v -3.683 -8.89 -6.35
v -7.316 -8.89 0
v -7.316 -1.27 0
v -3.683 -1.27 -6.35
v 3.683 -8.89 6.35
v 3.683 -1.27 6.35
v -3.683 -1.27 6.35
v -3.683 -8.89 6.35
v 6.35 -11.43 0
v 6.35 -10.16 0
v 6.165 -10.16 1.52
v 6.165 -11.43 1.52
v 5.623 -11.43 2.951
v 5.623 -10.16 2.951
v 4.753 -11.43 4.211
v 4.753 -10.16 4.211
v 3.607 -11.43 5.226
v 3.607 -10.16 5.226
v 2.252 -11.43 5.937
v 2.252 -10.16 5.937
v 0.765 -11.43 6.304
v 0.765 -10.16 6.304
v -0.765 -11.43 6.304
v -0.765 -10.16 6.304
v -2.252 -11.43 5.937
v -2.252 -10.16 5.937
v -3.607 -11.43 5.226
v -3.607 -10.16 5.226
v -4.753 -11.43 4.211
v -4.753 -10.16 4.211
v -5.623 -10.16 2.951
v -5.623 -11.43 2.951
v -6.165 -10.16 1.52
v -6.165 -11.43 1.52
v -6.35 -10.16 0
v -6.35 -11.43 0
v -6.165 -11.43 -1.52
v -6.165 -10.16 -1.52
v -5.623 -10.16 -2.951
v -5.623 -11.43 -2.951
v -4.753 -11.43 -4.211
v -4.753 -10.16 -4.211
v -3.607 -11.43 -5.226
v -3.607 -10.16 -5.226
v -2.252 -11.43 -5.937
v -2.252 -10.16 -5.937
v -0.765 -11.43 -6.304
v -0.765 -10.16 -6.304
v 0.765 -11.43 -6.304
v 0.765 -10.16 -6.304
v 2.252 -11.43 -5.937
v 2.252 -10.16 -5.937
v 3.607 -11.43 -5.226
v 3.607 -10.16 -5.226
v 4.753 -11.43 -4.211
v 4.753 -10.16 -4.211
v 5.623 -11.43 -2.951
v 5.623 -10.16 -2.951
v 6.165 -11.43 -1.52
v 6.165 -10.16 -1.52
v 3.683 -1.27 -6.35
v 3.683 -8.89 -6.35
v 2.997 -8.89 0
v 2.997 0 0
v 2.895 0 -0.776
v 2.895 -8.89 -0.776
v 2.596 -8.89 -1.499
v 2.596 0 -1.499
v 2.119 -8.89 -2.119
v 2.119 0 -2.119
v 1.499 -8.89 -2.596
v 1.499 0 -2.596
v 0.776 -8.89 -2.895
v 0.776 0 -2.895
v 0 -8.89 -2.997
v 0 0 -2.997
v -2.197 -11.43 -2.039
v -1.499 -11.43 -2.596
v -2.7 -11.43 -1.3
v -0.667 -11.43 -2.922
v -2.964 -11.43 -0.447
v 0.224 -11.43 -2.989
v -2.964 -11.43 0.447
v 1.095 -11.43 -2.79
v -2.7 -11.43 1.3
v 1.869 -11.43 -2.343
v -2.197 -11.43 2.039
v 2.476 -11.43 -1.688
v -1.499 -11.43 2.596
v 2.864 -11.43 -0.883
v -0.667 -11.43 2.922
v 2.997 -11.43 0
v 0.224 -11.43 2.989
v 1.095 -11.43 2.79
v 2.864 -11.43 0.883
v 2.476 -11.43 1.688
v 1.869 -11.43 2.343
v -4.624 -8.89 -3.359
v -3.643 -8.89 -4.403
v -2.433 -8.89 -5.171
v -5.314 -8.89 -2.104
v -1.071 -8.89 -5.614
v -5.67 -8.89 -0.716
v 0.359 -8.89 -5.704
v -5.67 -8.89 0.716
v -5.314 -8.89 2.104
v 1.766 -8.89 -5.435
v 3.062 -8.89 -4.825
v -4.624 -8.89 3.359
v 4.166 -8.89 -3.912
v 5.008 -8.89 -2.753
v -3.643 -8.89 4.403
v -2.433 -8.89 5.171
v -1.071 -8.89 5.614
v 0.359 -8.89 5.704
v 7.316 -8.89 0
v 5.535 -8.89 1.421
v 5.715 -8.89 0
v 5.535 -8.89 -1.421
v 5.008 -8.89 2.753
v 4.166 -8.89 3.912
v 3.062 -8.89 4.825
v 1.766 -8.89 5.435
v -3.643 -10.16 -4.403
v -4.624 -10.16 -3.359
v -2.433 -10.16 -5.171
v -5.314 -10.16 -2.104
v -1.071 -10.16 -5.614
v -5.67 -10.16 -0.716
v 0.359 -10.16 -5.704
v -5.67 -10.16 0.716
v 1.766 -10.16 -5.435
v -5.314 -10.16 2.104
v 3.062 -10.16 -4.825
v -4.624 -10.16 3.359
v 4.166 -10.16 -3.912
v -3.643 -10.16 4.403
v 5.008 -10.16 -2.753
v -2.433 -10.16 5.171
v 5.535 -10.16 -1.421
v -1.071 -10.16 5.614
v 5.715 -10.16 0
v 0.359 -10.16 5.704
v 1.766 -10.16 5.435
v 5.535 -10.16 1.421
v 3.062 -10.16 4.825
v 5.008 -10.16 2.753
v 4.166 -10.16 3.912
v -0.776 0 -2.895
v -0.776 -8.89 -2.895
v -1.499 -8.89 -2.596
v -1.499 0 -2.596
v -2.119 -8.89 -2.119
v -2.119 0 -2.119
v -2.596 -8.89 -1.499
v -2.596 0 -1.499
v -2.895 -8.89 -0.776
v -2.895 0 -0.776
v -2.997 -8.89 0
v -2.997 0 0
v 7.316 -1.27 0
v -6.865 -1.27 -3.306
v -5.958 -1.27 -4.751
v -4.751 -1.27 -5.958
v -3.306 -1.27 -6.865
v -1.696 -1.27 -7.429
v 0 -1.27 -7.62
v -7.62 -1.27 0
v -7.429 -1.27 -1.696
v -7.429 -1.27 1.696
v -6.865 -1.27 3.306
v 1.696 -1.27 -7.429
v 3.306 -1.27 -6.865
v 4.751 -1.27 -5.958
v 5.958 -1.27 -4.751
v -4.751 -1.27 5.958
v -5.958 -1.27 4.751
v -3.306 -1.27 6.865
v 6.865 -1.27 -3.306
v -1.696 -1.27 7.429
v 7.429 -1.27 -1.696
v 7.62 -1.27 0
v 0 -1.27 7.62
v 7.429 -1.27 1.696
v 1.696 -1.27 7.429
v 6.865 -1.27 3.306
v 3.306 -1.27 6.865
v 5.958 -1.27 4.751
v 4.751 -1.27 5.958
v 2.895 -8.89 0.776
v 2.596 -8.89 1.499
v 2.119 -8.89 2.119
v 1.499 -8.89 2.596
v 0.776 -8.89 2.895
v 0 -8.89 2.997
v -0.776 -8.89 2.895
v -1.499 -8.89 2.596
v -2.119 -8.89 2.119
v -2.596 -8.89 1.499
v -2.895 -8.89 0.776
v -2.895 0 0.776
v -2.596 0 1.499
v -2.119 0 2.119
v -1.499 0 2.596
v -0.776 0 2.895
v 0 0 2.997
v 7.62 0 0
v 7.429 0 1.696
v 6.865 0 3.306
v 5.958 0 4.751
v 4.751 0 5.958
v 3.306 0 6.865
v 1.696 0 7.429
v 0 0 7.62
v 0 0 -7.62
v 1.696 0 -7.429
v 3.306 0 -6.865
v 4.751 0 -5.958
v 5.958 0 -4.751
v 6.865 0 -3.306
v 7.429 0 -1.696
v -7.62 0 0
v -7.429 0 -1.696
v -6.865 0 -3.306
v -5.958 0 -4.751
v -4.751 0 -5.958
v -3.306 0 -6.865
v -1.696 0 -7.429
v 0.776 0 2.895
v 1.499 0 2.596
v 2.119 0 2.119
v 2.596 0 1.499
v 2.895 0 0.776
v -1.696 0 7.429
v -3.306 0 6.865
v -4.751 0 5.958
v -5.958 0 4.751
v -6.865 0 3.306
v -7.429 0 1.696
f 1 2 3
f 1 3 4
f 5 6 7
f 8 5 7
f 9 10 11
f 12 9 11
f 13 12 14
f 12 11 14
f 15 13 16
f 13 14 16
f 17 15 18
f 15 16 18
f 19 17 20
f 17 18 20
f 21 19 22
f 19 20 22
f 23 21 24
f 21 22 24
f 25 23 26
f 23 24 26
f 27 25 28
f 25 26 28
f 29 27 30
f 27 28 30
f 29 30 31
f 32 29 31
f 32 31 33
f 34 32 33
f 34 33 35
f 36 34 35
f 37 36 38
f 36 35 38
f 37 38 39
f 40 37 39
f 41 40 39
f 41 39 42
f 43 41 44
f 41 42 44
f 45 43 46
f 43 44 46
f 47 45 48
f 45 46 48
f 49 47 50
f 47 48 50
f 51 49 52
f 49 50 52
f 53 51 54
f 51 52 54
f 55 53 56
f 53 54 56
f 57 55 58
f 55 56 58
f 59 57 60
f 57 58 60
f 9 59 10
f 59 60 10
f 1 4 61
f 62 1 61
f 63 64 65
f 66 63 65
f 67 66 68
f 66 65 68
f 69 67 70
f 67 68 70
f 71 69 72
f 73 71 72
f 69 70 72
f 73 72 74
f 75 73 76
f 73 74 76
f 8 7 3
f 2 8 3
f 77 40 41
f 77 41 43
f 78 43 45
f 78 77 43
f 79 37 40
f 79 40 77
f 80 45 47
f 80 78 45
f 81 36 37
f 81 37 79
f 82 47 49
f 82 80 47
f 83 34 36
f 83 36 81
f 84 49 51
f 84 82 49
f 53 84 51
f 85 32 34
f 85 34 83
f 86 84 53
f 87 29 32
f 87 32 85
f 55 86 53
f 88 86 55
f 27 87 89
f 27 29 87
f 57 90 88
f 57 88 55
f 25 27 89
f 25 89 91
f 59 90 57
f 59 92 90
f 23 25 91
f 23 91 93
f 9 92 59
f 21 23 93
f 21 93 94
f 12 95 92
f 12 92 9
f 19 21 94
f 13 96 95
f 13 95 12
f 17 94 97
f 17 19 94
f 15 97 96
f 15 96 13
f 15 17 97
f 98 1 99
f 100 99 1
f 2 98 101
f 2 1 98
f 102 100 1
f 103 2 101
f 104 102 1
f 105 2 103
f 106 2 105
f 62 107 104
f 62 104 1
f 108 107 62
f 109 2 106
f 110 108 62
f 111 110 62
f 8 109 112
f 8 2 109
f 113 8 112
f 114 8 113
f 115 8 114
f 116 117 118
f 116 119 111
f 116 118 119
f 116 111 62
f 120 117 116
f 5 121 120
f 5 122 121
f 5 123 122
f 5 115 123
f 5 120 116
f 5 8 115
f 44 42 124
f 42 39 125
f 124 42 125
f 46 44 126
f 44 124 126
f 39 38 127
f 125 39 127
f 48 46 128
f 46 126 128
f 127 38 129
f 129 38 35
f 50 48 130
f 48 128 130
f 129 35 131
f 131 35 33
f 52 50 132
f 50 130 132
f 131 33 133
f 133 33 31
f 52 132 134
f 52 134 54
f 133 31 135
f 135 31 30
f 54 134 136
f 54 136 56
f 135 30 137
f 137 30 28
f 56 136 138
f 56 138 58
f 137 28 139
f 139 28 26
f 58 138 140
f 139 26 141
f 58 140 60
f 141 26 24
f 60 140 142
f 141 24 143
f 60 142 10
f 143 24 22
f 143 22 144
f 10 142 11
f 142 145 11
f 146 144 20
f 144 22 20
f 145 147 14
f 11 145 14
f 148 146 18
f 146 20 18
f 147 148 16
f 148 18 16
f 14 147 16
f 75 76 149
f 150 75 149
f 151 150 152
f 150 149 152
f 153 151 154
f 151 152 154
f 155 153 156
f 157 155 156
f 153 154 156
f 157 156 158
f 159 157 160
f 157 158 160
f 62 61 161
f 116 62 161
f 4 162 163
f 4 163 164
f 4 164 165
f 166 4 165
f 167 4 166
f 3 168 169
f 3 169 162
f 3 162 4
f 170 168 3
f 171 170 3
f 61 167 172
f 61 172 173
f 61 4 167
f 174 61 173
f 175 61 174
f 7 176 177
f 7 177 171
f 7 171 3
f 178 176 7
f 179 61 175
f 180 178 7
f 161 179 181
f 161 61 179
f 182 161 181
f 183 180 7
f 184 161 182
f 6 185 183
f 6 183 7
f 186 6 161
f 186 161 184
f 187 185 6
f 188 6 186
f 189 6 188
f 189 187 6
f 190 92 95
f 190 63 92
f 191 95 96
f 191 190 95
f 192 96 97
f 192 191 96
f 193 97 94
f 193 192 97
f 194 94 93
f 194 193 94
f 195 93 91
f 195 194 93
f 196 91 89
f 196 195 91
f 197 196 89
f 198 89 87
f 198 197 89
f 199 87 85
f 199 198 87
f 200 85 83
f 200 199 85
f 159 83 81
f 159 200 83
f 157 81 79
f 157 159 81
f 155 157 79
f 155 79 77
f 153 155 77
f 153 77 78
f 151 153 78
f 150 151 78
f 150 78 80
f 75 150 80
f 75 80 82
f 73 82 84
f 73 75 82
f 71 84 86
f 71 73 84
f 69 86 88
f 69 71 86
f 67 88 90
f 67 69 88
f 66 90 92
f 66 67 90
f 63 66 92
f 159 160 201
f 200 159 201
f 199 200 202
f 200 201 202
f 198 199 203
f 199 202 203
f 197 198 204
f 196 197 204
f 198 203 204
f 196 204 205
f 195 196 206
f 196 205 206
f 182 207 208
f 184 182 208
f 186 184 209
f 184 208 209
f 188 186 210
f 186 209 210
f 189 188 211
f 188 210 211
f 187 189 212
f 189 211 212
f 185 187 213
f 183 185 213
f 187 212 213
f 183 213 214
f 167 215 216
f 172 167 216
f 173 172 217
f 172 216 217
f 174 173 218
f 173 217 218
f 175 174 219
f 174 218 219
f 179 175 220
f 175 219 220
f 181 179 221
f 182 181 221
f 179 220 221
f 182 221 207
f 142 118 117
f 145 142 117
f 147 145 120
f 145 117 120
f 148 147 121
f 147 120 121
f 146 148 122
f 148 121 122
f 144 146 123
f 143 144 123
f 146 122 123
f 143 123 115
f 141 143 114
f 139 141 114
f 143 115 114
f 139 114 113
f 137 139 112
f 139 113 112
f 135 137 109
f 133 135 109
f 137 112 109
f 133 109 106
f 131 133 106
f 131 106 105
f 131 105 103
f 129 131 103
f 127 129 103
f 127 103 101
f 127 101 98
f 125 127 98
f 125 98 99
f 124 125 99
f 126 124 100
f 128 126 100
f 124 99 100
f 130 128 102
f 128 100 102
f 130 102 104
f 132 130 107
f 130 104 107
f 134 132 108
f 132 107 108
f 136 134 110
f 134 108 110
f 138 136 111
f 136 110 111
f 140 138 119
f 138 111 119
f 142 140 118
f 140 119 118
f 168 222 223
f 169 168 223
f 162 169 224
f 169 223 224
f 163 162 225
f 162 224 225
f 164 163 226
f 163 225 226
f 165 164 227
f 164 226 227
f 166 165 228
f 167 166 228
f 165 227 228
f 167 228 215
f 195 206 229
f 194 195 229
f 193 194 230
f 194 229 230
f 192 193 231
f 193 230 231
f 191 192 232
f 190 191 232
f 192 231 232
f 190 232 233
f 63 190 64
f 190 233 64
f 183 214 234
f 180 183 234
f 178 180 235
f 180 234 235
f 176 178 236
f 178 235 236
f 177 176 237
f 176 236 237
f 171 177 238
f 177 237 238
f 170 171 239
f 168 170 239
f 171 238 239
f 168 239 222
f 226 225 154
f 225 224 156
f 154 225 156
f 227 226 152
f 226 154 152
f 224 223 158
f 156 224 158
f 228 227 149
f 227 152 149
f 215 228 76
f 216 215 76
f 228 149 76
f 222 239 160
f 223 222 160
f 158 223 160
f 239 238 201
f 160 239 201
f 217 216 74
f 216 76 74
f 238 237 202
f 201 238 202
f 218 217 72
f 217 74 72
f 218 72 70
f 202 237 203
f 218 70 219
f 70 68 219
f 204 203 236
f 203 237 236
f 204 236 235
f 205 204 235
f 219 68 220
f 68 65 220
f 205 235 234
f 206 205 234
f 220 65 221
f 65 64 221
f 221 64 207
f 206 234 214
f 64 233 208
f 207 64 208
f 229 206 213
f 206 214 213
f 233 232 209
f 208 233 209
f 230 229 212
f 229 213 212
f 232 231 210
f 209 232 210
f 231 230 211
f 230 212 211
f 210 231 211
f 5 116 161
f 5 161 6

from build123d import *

# Parameters (mm, degrees)
F1_DEPTH = 1.27
F2_DEPTH = 8.89
F3_R     = 5.715
F3_R_2   = 2.9972
F4_DEPTH = 1.27
F5_R     = 6.35
F5_R_2   = 2.9972
F6_DEPTH = 1.27


with BuildPart() as f1:
    # F0 (on Front) → F1 (new body)
    with BuildSketch(Plane.XZ):
        with BuildLine():
            ThreePointArc((7.62, 0), (5.388154, 5.388154), (0, 7.62))
            Line((0, 7.62), (0, 6.35))
            Line((0, 6.35), (3.683, 6.35))
            Line((3.683, 6.35), (7.315638, 0))
            Line((7.315638, 0), (7.62, 0))
        make_face()
        with BuildLine():
            Line((0, 6.35), (0, 7.62))
            ThreePointArc((0, 7.62), (-5.388154, 5.388154), (-7.62, 0))
            Line((-7.62, 0), (-7.315638, 0))
            Line((-7.315638, 0), (-3.683, 6.35))
            Line((-3.683, 6.35), (0, 6.35))
        make_face()
        with BuildLine():
            ThreePointArc((0, -7.62), (5.388154, -5.388154), (7.62, 0))
            Line((7.62, 0), (7.315638, 0))
            Line((7.315638, 0), (3.683, -6.35))
            Line((3.683, -6.35), (0, -6.35))
            Line((0, -6.35), (0, -7.62))
        make_face()
        with BuildLine():
            Line((-7.315638, 0), (-7.62, 0))
            ThreePointArc((-7.62, 0), (-5.388154, -5.388154), (0, -7.62))
            Line((0, -7.62), (0, -6.35))
            Line((0, -6.35), (-3.683, -6.35))
            Line((-3.683, -6.35), (-7.315638, 0))
        make_face()
    extrude(amount=F1_DEPTH)

    # F0 (on Front) → F2 (join)
    with BuildSketch(Plane.XZ):
        with BuildLine():
            Line((3.683, 6.35), (0, 6.35))
            Line((0, 6.35), (0, 2.9972))
            ThreePointArc((0, 2.9972), (2.11934, 2.11934), (2.9972, 0))
            Line((2.9972, 0), (7.315638, 0))
            Line((7.315638, 0), (3.683, 6.35))
        make_face()
        with BuildLine():
            Line((0, 2.9972), (0, 6.35))
            Line((0, 6.35), (-3.683, 6.35))
            Line((-3.683, 6.35), (-7.315638, 0))
            Line((-7.315638, 0), (-2.9972, 0))
            ThreePointArc((-2.9972, 0), (-2.11934, 2.11934), (0, 2.9972))
        make_face()
        with BuildLine():
            Line((-2.9972, 0), (-7.315638, 0))
            Line((-7.315638, 0), (-3.683, -6.35))
            Line((-3.683, -6.35), (0, -6.35))
            Line((0, -6.35), (0, -2.9972))
            ThreePointArc((0, -2.9972), (-2.11934, -2.11934), (-2.9972, 0))
        make_face()
        with BuildLine():
            Line((3.683, -6.35), (7.315638, 0))
            Line((7.315638, 0), (2.9972, 0))
            ThreePointArc((2.9972, 0), (2.11934, -2.11934), (0, -2.9972))
            Line((0, -2.9972), (0, -6.35))
            Line((0, -6.35), (3.683, -6.35))
        make_face()
    extrude(amount=F2_DEPTH)

    # F3 (on face) → F4 (join)
    with BuildSketch(Plane.XZ.offset(8.89)):
        Circle(F3_R)
        Circle(F3_R_2, mode=Mode.SUBTRACT)
    extrude(amount=F4_DEPTH)

    # F5 (on face) → F6 (join)
    with BuildSketch(Plane.XZ.offset(10.16)):
        Circle(F5_R)
        Circle(F5_R_2, mode=Mode.SUBTRACT)
    extrude(amount=F6_DEPTH)


solid = f1.part
